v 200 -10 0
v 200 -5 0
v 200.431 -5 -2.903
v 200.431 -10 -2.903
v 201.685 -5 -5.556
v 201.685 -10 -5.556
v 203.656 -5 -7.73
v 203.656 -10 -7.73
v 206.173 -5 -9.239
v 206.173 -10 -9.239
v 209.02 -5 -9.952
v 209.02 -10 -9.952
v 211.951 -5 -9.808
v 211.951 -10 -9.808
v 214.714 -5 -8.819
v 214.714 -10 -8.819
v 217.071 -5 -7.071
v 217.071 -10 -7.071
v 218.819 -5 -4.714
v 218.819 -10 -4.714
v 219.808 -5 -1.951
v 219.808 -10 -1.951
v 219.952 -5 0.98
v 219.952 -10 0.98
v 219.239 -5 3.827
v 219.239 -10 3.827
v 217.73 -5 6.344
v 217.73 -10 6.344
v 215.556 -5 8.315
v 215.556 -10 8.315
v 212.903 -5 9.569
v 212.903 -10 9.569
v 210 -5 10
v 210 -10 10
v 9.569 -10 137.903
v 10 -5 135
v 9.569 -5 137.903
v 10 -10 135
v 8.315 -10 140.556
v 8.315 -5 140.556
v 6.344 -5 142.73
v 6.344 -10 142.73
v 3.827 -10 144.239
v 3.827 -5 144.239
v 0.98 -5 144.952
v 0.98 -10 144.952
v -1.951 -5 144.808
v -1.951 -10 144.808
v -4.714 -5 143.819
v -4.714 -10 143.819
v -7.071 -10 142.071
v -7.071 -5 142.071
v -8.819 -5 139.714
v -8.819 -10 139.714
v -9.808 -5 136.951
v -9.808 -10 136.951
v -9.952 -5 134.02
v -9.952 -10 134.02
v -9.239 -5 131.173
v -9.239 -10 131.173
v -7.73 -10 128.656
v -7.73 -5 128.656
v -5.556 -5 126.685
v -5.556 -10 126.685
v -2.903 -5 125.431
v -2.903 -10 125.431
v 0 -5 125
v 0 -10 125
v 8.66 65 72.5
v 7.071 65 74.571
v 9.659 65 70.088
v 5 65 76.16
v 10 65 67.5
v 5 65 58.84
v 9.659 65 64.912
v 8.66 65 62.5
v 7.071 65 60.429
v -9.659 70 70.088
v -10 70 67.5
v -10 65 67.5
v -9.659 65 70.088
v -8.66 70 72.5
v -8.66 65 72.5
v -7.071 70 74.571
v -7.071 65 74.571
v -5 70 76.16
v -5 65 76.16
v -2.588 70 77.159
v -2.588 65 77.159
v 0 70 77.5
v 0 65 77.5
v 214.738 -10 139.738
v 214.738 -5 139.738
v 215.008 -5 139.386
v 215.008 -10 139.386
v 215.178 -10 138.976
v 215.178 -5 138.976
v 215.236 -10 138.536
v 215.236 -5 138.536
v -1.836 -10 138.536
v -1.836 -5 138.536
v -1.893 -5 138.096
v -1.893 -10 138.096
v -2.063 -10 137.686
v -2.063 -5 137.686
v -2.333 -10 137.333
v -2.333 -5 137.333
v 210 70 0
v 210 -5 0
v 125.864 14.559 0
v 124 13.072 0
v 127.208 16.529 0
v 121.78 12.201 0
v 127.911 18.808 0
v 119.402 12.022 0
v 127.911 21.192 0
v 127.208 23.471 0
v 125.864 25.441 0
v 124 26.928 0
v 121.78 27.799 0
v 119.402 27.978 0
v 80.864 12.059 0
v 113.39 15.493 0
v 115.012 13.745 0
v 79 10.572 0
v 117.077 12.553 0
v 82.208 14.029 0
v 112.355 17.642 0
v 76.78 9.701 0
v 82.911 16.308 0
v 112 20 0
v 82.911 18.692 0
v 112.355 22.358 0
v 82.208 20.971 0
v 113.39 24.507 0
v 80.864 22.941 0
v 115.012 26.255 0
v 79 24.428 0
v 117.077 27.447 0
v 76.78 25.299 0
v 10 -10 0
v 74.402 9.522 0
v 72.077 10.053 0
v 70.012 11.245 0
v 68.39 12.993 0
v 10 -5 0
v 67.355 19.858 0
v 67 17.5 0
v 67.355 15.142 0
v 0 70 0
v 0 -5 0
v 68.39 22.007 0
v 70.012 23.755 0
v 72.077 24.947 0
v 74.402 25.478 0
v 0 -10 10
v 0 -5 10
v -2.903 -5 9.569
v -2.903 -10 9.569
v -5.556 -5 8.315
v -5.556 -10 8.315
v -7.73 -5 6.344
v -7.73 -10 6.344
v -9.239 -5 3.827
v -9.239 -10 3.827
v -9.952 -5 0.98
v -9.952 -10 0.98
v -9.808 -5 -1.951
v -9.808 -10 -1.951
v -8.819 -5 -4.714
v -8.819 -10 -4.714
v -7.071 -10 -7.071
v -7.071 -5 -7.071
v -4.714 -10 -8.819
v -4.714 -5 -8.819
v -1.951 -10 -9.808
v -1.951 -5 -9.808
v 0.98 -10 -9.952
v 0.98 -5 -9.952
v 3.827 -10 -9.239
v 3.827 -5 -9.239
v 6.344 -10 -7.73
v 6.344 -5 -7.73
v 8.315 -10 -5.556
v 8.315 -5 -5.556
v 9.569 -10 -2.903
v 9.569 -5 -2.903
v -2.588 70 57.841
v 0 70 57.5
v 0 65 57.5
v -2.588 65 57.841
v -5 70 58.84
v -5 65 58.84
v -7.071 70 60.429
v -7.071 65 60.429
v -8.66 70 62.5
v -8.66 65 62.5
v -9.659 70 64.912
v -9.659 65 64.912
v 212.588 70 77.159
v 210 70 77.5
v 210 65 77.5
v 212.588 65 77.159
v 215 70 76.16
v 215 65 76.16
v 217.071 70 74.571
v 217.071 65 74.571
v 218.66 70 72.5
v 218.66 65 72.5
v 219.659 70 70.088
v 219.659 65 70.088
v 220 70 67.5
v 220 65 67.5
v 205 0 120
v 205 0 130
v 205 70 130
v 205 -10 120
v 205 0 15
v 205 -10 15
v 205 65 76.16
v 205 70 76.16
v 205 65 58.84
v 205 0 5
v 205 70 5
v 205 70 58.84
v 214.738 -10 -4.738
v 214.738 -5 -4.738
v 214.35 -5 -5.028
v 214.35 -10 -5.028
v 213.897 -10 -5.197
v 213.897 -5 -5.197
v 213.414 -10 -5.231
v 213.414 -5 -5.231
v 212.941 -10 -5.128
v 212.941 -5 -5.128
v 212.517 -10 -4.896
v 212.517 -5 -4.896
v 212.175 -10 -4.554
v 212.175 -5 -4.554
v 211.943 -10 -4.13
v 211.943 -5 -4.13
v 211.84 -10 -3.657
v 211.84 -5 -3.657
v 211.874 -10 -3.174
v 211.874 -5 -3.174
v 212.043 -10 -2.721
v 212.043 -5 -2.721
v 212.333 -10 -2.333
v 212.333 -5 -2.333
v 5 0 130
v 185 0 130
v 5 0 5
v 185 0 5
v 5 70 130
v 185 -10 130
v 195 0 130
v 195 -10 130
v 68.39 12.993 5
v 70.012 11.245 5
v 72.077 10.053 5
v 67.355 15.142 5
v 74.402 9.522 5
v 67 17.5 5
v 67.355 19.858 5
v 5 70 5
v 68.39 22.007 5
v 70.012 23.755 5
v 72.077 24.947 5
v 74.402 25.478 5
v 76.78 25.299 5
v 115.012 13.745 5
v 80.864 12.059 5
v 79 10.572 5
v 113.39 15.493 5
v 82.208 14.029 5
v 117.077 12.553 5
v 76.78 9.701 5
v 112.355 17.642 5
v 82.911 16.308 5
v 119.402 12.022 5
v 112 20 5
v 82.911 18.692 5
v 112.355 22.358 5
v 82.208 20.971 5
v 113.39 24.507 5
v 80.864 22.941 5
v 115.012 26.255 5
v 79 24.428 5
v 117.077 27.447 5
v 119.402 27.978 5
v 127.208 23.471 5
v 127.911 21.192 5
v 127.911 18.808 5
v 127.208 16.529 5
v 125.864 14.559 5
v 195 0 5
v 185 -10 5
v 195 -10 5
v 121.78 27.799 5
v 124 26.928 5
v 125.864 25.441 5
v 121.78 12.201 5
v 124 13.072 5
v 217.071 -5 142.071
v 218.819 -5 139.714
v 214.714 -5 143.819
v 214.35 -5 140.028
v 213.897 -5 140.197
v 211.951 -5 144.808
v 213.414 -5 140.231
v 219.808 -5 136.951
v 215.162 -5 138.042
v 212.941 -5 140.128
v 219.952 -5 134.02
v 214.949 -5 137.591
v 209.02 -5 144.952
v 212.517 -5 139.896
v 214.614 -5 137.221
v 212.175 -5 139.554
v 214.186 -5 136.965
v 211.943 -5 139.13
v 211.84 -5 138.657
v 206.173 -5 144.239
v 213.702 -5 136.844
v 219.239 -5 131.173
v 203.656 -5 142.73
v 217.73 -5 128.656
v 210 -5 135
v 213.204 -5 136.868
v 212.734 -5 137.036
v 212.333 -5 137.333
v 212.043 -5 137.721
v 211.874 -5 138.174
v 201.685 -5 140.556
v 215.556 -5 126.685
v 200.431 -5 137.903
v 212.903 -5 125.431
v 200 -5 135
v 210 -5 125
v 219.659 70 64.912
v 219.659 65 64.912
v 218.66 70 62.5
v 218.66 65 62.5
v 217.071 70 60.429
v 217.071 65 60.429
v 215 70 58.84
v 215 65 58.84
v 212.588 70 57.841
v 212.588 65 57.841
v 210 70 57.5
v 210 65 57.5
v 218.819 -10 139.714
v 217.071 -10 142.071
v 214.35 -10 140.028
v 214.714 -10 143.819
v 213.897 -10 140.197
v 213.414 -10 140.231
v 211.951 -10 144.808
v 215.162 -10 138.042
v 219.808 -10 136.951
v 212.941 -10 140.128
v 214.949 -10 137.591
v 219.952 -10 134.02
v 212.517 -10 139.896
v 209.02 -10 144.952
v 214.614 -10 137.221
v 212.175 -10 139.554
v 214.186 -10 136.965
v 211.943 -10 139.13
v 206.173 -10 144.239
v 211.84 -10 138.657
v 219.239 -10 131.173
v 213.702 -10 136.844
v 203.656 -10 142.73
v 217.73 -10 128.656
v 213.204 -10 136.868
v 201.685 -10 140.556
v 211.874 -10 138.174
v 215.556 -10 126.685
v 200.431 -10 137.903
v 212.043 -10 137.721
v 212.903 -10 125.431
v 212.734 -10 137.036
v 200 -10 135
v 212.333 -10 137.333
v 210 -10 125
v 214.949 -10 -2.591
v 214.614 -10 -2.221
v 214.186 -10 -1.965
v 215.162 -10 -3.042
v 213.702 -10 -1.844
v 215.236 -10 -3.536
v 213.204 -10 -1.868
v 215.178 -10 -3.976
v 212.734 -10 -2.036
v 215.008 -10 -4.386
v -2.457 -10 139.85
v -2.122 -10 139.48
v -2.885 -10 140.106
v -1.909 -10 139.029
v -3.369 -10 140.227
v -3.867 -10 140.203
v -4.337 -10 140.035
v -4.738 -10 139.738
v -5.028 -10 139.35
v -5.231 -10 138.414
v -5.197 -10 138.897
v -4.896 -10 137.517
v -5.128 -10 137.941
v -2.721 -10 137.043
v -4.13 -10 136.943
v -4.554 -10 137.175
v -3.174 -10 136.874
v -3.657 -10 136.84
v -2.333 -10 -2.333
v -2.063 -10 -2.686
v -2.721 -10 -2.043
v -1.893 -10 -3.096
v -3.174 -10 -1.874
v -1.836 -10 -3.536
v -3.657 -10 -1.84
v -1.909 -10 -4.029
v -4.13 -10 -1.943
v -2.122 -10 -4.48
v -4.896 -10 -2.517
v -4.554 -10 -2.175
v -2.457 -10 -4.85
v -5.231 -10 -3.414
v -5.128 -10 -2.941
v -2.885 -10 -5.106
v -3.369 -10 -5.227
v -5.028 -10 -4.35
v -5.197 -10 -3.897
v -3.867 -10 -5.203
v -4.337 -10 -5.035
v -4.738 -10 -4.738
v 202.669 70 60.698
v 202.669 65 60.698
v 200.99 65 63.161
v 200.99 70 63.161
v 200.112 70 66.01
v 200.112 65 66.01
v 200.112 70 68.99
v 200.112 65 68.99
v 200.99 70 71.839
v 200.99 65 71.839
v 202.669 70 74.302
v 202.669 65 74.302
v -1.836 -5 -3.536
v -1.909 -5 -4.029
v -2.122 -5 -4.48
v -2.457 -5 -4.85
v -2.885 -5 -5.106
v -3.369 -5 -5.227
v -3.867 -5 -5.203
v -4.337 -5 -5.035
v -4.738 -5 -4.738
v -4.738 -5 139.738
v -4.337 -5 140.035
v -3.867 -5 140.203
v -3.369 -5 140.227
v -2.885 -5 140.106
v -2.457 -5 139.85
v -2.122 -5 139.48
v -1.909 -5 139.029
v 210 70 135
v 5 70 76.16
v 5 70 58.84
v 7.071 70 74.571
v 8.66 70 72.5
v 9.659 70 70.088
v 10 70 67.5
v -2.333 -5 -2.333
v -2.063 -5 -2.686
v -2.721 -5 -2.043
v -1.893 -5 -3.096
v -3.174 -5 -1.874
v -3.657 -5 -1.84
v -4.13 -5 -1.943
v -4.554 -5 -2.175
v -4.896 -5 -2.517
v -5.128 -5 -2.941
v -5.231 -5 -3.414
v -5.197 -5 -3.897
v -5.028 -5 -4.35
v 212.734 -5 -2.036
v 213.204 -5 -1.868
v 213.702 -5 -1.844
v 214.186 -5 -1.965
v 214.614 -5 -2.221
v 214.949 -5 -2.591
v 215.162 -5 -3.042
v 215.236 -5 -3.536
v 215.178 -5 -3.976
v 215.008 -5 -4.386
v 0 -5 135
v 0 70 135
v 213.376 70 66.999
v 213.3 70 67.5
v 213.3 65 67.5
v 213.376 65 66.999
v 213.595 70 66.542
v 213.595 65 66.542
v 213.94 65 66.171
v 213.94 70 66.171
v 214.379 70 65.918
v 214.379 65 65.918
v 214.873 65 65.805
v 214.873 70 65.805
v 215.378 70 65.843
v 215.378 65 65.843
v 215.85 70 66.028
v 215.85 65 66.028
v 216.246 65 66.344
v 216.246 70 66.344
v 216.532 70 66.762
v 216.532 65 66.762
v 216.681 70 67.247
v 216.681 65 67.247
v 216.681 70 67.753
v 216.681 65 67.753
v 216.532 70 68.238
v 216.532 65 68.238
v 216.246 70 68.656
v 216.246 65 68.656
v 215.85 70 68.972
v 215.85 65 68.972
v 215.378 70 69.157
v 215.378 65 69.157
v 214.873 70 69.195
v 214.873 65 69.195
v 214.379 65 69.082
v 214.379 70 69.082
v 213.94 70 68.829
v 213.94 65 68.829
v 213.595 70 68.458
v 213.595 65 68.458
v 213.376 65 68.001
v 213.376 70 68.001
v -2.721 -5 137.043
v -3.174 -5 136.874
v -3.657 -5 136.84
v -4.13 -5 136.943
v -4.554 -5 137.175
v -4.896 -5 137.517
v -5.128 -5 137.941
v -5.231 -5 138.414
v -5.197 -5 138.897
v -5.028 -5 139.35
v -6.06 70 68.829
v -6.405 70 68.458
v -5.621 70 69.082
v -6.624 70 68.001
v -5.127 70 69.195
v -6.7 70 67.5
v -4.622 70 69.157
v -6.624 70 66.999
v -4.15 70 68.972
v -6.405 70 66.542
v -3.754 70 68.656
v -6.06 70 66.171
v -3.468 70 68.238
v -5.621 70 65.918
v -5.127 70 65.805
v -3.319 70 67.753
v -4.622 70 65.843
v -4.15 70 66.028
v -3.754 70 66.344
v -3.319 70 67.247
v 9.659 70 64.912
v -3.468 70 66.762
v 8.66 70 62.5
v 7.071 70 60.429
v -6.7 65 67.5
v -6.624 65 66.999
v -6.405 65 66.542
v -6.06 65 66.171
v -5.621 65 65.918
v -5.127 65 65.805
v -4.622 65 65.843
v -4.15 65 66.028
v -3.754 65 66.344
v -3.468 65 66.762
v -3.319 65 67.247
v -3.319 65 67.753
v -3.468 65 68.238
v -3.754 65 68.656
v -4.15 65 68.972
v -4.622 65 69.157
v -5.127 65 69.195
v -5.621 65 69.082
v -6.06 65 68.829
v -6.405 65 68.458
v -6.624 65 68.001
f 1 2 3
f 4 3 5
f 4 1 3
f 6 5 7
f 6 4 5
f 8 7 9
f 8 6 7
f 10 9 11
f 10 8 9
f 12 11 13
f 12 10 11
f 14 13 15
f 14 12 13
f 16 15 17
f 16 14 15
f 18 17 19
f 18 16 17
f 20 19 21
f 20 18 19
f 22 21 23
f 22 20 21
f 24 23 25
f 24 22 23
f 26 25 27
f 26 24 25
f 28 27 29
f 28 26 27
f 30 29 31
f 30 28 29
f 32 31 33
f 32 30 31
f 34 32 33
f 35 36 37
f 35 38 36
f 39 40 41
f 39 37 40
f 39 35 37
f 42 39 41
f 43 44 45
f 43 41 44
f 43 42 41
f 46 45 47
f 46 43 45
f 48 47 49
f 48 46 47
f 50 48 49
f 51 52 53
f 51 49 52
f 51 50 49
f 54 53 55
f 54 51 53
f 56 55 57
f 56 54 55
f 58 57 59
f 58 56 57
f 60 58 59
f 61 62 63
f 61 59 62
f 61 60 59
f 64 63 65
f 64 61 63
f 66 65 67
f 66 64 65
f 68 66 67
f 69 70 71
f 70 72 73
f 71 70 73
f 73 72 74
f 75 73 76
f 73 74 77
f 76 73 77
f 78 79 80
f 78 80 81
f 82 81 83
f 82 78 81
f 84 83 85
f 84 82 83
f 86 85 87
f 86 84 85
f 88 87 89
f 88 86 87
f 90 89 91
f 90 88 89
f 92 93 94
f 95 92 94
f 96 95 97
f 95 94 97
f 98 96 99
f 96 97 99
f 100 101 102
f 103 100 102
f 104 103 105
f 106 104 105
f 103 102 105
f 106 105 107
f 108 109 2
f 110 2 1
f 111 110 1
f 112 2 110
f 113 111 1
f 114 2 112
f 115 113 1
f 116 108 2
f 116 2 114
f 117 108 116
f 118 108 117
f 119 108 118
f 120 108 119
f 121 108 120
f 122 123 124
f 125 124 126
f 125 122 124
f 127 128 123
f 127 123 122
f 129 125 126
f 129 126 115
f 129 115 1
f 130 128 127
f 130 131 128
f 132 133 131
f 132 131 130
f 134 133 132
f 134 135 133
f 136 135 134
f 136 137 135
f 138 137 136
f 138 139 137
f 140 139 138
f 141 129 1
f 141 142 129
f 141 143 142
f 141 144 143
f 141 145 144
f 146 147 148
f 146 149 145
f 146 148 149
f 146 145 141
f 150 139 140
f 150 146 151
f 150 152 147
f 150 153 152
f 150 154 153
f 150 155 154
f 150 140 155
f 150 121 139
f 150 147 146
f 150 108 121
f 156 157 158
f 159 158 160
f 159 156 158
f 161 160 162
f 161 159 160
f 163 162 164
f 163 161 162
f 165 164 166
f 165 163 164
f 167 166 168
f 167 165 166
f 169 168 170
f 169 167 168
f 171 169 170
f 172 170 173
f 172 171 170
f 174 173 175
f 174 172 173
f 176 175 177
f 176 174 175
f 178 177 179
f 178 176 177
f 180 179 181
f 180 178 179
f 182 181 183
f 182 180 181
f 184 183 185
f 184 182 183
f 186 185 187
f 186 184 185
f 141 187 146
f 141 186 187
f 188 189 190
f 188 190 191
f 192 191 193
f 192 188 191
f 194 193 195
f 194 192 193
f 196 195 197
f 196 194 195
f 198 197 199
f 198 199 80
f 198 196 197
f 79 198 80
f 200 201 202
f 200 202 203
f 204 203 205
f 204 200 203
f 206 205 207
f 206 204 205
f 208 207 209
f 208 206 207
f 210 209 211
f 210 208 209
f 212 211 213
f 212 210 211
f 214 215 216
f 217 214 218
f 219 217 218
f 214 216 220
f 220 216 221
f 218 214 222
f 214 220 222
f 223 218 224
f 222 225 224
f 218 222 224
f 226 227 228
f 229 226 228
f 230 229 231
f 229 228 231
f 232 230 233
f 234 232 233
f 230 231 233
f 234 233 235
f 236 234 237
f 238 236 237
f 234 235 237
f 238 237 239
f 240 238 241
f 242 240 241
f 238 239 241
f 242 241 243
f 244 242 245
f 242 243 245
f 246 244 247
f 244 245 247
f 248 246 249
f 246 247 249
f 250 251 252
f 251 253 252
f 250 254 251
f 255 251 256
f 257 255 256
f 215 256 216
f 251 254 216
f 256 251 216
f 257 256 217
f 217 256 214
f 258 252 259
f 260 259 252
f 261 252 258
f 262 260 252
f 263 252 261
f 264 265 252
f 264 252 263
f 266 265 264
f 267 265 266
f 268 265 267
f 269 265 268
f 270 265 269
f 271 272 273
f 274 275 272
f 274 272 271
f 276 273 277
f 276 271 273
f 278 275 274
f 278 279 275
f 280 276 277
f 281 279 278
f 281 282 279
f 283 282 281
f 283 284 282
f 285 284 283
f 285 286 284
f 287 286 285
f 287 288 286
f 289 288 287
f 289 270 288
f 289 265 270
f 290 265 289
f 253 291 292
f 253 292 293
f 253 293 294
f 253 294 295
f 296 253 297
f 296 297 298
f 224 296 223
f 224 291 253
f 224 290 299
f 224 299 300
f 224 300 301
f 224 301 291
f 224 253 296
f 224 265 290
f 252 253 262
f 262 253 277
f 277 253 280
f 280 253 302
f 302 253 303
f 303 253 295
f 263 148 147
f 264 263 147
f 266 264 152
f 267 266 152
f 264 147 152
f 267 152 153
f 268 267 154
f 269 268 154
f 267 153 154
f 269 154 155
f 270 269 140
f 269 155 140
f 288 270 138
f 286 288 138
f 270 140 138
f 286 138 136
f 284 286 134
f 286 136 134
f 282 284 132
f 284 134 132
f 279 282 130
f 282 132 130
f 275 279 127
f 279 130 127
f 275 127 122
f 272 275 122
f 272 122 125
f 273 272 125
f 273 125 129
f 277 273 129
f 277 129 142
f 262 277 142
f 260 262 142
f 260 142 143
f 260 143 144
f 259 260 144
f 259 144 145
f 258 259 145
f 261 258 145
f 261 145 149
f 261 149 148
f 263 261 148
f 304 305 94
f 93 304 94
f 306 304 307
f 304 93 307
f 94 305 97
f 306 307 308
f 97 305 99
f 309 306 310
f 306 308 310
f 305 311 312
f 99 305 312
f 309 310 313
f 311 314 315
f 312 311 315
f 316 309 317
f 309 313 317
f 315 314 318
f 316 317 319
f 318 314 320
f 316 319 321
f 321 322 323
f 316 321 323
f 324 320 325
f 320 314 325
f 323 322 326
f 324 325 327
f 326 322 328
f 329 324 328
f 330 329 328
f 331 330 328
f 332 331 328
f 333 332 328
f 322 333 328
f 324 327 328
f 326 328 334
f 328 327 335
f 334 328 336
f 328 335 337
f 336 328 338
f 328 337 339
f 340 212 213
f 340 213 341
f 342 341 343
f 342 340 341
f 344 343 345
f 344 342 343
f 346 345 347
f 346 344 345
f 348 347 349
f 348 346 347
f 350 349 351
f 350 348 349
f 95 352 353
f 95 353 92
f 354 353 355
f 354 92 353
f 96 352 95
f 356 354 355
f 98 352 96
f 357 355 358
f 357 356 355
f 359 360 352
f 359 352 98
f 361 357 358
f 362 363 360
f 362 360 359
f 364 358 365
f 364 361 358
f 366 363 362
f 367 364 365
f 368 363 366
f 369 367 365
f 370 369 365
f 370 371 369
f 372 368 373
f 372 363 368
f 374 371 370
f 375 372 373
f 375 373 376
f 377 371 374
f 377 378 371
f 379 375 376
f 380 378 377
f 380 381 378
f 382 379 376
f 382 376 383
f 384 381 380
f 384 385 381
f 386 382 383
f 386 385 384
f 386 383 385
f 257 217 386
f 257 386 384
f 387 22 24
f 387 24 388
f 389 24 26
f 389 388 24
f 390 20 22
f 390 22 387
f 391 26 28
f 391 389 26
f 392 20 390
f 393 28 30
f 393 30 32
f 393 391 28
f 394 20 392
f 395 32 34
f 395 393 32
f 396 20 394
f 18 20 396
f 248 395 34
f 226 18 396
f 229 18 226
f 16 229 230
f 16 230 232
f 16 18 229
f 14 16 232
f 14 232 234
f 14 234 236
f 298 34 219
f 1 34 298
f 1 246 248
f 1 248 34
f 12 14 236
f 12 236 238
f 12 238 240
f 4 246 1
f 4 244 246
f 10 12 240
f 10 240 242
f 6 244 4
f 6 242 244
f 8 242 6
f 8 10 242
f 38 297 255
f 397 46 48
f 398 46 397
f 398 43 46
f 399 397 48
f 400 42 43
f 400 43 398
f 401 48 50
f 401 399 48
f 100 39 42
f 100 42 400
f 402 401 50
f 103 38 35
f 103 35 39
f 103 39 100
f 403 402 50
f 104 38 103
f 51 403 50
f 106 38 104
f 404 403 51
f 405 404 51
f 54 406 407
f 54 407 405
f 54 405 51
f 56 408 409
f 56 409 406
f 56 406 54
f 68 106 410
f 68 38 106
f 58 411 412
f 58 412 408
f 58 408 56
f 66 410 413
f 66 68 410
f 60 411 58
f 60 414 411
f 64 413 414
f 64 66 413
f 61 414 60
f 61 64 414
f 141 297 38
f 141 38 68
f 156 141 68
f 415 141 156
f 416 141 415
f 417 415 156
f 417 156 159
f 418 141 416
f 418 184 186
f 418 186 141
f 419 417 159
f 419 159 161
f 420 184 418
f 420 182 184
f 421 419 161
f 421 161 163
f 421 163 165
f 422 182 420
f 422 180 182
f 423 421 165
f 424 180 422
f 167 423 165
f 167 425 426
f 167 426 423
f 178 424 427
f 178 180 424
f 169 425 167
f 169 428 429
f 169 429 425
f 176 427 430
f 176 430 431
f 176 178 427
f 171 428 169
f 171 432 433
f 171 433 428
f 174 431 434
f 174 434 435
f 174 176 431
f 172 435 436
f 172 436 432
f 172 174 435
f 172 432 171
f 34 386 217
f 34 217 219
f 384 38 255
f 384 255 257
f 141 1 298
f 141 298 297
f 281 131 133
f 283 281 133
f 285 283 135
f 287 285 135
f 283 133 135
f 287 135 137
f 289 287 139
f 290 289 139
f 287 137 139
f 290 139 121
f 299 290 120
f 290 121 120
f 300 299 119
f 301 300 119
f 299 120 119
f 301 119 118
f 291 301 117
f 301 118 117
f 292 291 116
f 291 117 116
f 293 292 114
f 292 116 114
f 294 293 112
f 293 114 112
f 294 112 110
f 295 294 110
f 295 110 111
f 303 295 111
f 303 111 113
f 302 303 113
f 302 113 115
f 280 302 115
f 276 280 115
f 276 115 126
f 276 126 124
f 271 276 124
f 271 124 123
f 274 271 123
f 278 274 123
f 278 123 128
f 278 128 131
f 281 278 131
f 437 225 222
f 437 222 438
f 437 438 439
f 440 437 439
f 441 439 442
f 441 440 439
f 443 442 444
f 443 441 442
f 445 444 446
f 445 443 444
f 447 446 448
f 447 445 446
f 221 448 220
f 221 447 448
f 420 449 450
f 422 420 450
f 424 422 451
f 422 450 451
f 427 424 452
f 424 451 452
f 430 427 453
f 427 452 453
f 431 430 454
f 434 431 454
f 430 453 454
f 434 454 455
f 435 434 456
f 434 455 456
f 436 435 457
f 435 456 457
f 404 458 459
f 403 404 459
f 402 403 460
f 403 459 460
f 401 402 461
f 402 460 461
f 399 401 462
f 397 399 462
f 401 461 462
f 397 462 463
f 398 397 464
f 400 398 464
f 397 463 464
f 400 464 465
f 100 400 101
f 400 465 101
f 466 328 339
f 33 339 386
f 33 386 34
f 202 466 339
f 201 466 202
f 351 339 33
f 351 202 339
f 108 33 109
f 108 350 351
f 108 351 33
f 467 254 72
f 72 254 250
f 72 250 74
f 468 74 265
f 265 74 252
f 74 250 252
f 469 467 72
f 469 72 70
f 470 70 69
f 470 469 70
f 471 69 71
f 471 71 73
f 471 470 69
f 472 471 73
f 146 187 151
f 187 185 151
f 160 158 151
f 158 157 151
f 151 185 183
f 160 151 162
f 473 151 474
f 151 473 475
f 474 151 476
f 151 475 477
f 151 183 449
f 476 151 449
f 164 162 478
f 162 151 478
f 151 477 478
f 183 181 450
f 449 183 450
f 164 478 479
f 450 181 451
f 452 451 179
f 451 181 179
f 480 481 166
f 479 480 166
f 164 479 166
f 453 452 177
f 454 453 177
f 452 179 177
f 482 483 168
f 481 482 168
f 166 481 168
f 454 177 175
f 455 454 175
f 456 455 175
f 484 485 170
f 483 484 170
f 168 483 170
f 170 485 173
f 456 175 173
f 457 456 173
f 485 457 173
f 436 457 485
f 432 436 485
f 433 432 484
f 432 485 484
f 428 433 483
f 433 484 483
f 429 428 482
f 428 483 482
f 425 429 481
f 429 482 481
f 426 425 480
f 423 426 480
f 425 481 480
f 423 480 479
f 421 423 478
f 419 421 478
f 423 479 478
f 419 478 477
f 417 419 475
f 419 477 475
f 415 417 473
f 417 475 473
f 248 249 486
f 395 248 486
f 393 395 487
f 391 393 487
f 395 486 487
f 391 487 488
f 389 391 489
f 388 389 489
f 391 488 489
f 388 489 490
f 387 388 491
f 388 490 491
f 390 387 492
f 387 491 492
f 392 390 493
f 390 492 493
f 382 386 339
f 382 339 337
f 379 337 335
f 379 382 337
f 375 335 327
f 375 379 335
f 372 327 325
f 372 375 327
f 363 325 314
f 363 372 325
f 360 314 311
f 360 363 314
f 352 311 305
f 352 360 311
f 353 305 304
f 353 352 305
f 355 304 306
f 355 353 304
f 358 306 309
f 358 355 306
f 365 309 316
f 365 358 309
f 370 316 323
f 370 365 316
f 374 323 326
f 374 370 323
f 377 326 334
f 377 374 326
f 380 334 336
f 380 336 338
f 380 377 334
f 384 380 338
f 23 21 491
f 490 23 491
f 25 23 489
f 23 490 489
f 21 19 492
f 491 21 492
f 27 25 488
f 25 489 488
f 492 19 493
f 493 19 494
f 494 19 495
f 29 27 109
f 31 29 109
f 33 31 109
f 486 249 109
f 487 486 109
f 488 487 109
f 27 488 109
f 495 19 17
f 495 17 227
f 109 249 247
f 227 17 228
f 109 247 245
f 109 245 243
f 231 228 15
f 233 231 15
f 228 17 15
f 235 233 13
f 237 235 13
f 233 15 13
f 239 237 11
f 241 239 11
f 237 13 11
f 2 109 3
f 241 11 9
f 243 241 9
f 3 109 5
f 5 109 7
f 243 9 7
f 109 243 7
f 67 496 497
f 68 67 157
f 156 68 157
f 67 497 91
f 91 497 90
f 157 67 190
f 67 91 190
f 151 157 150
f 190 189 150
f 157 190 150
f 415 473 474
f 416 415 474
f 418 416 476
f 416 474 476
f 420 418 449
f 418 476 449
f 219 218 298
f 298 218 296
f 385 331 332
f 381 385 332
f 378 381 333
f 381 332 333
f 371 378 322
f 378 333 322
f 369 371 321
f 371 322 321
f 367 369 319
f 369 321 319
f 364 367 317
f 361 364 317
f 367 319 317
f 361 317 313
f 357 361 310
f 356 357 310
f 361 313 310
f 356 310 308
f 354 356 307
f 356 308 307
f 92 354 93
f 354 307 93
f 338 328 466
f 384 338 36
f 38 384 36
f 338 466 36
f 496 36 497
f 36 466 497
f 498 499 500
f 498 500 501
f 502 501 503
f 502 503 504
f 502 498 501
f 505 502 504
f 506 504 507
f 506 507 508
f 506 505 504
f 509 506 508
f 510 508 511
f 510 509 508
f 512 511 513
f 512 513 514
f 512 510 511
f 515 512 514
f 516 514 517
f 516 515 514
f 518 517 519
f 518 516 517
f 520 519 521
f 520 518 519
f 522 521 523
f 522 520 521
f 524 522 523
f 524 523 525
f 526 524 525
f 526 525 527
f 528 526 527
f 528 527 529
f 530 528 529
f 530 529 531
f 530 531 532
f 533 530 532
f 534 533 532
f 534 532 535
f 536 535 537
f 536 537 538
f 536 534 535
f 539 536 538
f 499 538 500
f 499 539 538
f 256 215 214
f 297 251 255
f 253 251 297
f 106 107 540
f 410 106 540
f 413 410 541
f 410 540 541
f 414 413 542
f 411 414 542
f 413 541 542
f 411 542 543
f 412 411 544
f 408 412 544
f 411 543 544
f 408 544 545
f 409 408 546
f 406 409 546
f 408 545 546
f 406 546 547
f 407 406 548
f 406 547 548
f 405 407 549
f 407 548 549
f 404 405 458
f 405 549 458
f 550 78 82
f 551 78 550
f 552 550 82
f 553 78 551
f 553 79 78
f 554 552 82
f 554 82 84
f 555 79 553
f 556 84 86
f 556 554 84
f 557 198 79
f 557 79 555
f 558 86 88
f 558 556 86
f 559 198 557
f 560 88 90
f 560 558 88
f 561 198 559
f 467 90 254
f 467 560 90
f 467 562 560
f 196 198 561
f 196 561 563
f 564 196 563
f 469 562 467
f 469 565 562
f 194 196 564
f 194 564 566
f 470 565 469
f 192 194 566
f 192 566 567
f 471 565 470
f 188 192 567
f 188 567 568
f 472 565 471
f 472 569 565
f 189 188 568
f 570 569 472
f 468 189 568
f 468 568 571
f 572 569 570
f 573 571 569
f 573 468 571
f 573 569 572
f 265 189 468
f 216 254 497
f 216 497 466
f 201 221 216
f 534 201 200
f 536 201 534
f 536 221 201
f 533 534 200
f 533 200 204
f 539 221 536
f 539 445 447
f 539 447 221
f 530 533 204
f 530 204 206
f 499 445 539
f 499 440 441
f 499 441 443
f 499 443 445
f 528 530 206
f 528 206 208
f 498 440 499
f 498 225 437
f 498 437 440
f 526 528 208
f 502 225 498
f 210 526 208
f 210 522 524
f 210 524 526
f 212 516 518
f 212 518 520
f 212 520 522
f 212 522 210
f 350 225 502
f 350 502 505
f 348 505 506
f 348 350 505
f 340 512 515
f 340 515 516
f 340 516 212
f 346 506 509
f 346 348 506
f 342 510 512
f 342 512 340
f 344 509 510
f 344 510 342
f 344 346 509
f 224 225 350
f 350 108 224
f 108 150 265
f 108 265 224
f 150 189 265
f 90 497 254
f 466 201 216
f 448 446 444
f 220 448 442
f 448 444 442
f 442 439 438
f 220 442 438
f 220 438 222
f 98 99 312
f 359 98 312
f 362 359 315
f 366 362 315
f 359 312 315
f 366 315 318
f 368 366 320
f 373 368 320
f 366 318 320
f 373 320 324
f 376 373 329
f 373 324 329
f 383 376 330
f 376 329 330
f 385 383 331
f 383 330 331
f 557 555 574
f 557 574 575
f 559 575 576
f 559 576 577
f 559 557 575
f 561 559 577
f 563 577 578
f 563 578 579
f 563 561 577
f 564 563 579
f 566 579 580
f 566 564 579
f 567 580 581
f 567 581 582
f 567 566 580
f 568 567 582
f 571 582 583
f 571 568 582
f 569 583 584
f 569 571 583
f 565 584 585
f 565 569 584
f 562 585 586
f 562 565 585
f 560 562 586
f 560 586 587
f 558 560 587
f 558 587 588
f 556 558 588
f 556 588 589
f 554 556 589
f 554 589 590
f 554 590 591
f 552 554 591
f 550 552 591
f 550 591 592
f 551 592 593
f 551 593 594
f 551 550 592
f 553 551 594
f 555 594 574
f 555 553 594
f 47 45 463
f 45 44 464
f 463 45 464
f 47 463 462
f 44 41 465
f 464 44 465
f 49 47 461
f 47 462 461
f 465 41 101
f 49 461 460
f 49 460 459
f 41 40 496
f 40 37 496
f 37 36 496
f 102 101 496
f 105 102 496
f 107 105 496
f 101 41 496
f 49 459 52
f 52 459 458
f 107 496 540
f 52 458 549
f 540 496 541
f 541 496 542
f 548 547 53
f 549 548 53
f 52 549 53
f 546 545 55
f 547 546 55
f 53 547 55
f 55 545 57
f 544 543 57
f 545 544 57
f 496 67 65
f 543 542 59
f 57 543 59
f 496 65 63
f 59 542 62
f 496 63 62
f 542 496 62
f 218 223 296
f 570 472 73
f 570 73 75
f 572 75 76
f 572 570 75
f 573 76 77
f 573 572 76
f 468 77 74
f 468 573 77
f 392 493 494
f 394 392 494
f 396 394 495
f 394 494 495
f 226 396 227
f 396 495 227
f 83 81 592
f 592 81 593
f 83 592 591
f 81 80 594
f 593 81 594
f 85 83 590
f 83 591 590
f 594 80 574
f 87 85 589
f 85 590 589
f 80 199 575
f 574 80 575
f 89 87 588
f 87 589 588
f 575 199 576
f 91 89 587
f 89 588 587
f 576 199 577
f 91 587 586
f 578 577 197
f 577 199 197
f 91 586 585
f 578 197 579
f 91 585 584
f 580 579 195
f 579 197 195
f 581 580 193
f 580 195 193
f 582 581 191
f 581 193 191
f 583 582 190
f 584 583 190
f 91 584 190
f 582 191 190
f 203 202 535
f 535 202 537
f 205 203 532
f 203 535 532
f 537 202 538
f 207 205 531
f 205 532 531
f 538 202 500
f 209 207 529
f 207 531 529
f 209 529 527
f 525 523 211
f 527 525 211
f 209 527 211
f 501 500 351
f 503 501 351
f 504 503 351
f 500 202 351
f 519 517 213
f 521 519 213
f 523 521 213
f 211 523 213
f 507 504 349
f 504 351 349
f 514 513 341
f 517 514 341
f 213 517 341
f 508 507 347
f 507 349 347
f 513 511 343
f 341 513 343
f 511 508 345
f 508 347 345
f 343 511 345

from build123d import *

# Parameters (mm, degrees)
SKETCH1_W           = 200
SKETCH1_H           = 125
BOSS_EXTRUDE1_DEPTH = 70
SKETCH2_W           = 210
SKETCH2_H           = 135
BOSS_EXTRUDE2_DEPTH = 10
SKETCH3_R           = 10
BOSS_EXTRUDE5_DEPTH = 5
CUT_EXTRUDE2_DEPTH  = 5
CUT_EXTRUDE3_DEPTH  = 10
SKETCH10_W          = 10
SKETCH10_H          = 125
CUT_EXTRUDE4_DEPTH  = 10
BOSS_EXTRUDE6_DEPTH = 5
SKETCH12_R          = 8
CUT_EXTRUDE5_DEPTH  = 10


with BuildPart() as part:
    # Sketch1 → Boss-Extrude1 (new body)
    with BuildSketch(Plane(origin=(0, 0, 0), x_dir=(1, 0, 0), z_dir=(0, 1, 0))):
        Polygon((210, 0), (0, 0), (0, -135), (5, -135), (210, -135), align=None)
        with Locations((105, -67.5)):
            Rectangle(SKETCH1_W, SKETCH1_H, mode=Mode.SUBTRACT)
    extrude(amount=BOSS_EXTRUDE1_DEPTH)

    # Sketch2 → Boss-Extrude2 (add)
    with BuildSketch(Plane(origin=(0, 0, 0), x_dir=(-1, 0, 0), z_dir=(0, -1, 0))):
        with Locations((-105, -67.5)):
            Rectangle(SKETCH2_W, SKETCH2_H)
    extrude(amount=BOSS_EXTRUDE2_DEPTH)

    # Sketch3 → Boss-Extrude5 (add)
    with BuildSketch(Plane(origin=(0, -10, 0), x_dir=(-1, 0, 0), z_dir=(0, -1, 0))):
        with Locations((-210, 0)):
            Circle(SKETCH3_R)
        Circle(SKETCH3_R)
        with Locations((0, -135)):
            Circle(SKETCH3_R)
        with Locations((-210, -135)):
            Circle(SKETCH3_R)
    extrude(amount=-BOSS_EXTRUDE5_DEPTH)

    # Sketch7 → Cut-Extrude2 (cut)
    with BuildSketch(Plane(origin=(0, -5, 0), x_dir=(1, 0, 0), z_dir=(0, 1, 0))):
        with BuildLine():
            ThreePointArc((215.235533906, -138.535533906), (214.186095741, -136.964938701), (212.333452378, -137.333452378))
            Line((212.333452378, -137.333452378), (214.737615434, -139.737615434))
            ThreePointArc((214.737615434, -139.737615434), (215.106129111, -139.186095741), (215.235533906, -138.535533906))
        make_face()
        with BuildLine():
            Line((214.737615434, -139.737615434), (212.333452378, -137.333452378))
            ThreePointArc((212.333452378, -137.333452378), (212.333452378, -139.737615434), (214.737615434, -139.737615434))
        make_face()
        with BuildLine():
            ThreePointArc((214.737615434, 4.737615434), (212.333452378, 4.737615434), (212.333452378, 2.333452378))
            Line((212.333452378, 2.333452378), (214.737615434, 4.737615434))
        make_face()
        with BuildLine():
            Line((214.737615434, 4.737615434), (212.333452378, 2.333452378))
            ThreePointArc((212.333452378, 2.333452378), (214.186095741, 1.964938701), (215.235533906, 3.535533906))
            ThreePointArc((215.235533906, 3.535533906), (215.106129111, 4.186095741), (214.737615434, 4.737615434))
        make_face()
        with BuildLine():
            ThreePointArc((-4.737615434, 4.737615434), (-4.737615434, 2.333452378), (-2.333452378, 2.333452378))
            Line((-2.333452378, 2.333452378), (-4.737615434, 4.737615434))
        make_face()
        with BuildLine():
            Line((-4.737615434, 4.737615434), (-2.333452378, 2.333452378))
            ThreePointArc((-2.333452378, 2.333452378), (-1.964938701, 2.884972071), (-1.835533906, 3.535533906))
            ThreePointArc((-1.835533906, 3.535533906), (-2.884972071, 5.106129111), (-4.737615434, 4.737615434))
        make_face()
        with BuildLine():
            ThreePointArc((-1.835533906, -138.535533906), (-1.964938701, -137.884972071), (-2.333452378, -137.333452378))
            Line((-2.333452378, -137.333452378), (-4.737615434, -139.737615434))
            ThreePointArc((-4.737615434, -139.737615434), (-2.884972071, -140.106129111), (-1.835533906, -138.535533906))
        make_face()
        with BuildLine():
            Line((-4.737615434, -139.737615434), (-2.333452378, -137.333452378))
            ThreePointArc((-2.333452378, -137.333452378), (-4.737615434, -137.333452378), (-4.737615434, -139.737615434))
        make_face()
    extrude(amount=-CUT_EXTRUDE2_DEPTH, mode=Mode.SUBTRACT)

    # Sketch9 → Cut-Extrude3 (cut)
    with BuildSketch(Plane(origin=(0, 0, 0), x_dir=(1, 0, 0), z_dir=(0, 1, 0))):
        Polygon((195, -130), (200, -125), (205, -120), (205, -15), (200, -10), (195, -5), align=None)
    extrude(amount=-CUT_EXTRUDE3_DEPTH, mode=Mode.SUBTRACT)

    # Sketch10 → Cut-Extrude4 (cut)
    with BuildSketch(Plane(origin=(0, 0, 0), x_dir=(1, 0, 0), z_dir=(0, 1, 0))):
        with Locations((190, -67.5)):
            Rectangle(SKETCH10_W, SKETCH10_H)
    extrude(amount=-CUT_EXTRUDE4_DEPTH, mode=Mode.SUBTRACT)

    # Sketch11 → Boss-Extrude6 (add)
    with BuildSketch(Plane(origin=(0, 70, 0), x_dir=(1, 0, 0), z_dir=(0, 1, 0))):
        with BuildLine():
            ThreePointArc((213.3, -67.5), (215, -65.8), (216.7, -67.5))
            Line((216.7, -67.5), (220, -67.5))
            ThreePointArc((220, -67.5), (217.071067812, -60.428932188), (210, -57.5))
            Line((210, -57.5), (210, -67.5))
            Line((210, -67.5), (213.3, -67.5))
        make_face()
        with BuildLine():
            Line((220, -67.5), (216.7, -67.5))
            ThreePointArc((216.7, -67.5), (215, -69.2), (213.3, -67.5))
            Line((213.3, -67.5), (210, -67.5))
            Line((210, -67.5), (210, -77.5))
            ThreePointArc((210, -77.5), (217.071067812, -74.571067812), (220, -67.5))
        make_face()
        with BuildLine():
            Line((205, -76.160254038), (205, -58.839745962))
            ThreePointArc((205, -58.839745962), (200, -67.5), (205, -76.160254038))
        make_face()
        with BuildLine():
            Line((210, -67.5), (210, -57.5))
            ThreePointArc((210, -57.5), (207.411809549, -57.840741737), (205, -58.839745962))
            Line((205, -58.839745962), (205, -76.160254038))
            ThreePointArc((205, -76.160254038), (207.411809549, -77.159258263), (210, -77.5))
            Line((210, -77.5), (210, -67.5))
        make_face()
        with BuildLine():
            ThreePointArc((10, -67.5), (8.660254038, -62.5), (5, -58.839745962))
            Line((5, -58.839745962), (5, -76.160254038))
            ThreePointArc((5, -76.160254038), (8.660254038, -72.5), (10, -67.5))
        make_face()
        with BuildLine():
            Line((0, -57.5), (0, -67.5))
            Line((0, -67.5), (0, -77.5))
            ThreePointArc((0, -77.5), (2.588190451, -77.159258263), (5, -76.160254038))
            Line((5, -76.160254038), (5, -58.839745962))
            ThreePointArc((5, -58.839745962), (2.588190451, -57.840741737), (0, -57.5))
        make_face()
        with BuildLine():
            Line((0, -77.5), (0, -67.5))
            Line((0, -67.5), (-3.3, -67.5))
            ThreePointArc((-3.3, -67.5), (-5, -69.2), (-6.7, -67.5))
            Line((-6.7, -67.5), (-10, -67.5))
            ThreePointArc((-10, -67.5), (-7.071067812, -74.571067812), (0, -77.5))
        make_face()
        with BuildLine():
            Line((-3.3, -67.5), (0, -67.5))
            Line((0, -67.5), (0, -57.5))
            ThreePointArc((0, -57.5), (-7.071067812, -60.428932188), (-10, -67.5))
            Line((-10, -67.5), (-6.7, -67.5))
            ThreePointArc((-6.7, -67.5), (-5, -65.8), (-3.3, -67.5))
        make_face()
    extrude(amount=-BOSS_EXTRUDE6_DEPTH)

    # Sketch12 → Cut-Extrude5 (cut)
    with BuildSketch(Plane(origin=(0, 0, 0), x_dir=(-1, 0, 0), z_dir=(0, 0, -1))):
        with Locations((-75, 17.5)):
            Circle(SKETCH12_R)
        with Locations((-120, 20)):
            Circle(SKETCH12_R)
    extrude(amount=-CUT_EXTRUDE5_DEPTH, mode=Mode.SUBTRACT)


solid = part.part
